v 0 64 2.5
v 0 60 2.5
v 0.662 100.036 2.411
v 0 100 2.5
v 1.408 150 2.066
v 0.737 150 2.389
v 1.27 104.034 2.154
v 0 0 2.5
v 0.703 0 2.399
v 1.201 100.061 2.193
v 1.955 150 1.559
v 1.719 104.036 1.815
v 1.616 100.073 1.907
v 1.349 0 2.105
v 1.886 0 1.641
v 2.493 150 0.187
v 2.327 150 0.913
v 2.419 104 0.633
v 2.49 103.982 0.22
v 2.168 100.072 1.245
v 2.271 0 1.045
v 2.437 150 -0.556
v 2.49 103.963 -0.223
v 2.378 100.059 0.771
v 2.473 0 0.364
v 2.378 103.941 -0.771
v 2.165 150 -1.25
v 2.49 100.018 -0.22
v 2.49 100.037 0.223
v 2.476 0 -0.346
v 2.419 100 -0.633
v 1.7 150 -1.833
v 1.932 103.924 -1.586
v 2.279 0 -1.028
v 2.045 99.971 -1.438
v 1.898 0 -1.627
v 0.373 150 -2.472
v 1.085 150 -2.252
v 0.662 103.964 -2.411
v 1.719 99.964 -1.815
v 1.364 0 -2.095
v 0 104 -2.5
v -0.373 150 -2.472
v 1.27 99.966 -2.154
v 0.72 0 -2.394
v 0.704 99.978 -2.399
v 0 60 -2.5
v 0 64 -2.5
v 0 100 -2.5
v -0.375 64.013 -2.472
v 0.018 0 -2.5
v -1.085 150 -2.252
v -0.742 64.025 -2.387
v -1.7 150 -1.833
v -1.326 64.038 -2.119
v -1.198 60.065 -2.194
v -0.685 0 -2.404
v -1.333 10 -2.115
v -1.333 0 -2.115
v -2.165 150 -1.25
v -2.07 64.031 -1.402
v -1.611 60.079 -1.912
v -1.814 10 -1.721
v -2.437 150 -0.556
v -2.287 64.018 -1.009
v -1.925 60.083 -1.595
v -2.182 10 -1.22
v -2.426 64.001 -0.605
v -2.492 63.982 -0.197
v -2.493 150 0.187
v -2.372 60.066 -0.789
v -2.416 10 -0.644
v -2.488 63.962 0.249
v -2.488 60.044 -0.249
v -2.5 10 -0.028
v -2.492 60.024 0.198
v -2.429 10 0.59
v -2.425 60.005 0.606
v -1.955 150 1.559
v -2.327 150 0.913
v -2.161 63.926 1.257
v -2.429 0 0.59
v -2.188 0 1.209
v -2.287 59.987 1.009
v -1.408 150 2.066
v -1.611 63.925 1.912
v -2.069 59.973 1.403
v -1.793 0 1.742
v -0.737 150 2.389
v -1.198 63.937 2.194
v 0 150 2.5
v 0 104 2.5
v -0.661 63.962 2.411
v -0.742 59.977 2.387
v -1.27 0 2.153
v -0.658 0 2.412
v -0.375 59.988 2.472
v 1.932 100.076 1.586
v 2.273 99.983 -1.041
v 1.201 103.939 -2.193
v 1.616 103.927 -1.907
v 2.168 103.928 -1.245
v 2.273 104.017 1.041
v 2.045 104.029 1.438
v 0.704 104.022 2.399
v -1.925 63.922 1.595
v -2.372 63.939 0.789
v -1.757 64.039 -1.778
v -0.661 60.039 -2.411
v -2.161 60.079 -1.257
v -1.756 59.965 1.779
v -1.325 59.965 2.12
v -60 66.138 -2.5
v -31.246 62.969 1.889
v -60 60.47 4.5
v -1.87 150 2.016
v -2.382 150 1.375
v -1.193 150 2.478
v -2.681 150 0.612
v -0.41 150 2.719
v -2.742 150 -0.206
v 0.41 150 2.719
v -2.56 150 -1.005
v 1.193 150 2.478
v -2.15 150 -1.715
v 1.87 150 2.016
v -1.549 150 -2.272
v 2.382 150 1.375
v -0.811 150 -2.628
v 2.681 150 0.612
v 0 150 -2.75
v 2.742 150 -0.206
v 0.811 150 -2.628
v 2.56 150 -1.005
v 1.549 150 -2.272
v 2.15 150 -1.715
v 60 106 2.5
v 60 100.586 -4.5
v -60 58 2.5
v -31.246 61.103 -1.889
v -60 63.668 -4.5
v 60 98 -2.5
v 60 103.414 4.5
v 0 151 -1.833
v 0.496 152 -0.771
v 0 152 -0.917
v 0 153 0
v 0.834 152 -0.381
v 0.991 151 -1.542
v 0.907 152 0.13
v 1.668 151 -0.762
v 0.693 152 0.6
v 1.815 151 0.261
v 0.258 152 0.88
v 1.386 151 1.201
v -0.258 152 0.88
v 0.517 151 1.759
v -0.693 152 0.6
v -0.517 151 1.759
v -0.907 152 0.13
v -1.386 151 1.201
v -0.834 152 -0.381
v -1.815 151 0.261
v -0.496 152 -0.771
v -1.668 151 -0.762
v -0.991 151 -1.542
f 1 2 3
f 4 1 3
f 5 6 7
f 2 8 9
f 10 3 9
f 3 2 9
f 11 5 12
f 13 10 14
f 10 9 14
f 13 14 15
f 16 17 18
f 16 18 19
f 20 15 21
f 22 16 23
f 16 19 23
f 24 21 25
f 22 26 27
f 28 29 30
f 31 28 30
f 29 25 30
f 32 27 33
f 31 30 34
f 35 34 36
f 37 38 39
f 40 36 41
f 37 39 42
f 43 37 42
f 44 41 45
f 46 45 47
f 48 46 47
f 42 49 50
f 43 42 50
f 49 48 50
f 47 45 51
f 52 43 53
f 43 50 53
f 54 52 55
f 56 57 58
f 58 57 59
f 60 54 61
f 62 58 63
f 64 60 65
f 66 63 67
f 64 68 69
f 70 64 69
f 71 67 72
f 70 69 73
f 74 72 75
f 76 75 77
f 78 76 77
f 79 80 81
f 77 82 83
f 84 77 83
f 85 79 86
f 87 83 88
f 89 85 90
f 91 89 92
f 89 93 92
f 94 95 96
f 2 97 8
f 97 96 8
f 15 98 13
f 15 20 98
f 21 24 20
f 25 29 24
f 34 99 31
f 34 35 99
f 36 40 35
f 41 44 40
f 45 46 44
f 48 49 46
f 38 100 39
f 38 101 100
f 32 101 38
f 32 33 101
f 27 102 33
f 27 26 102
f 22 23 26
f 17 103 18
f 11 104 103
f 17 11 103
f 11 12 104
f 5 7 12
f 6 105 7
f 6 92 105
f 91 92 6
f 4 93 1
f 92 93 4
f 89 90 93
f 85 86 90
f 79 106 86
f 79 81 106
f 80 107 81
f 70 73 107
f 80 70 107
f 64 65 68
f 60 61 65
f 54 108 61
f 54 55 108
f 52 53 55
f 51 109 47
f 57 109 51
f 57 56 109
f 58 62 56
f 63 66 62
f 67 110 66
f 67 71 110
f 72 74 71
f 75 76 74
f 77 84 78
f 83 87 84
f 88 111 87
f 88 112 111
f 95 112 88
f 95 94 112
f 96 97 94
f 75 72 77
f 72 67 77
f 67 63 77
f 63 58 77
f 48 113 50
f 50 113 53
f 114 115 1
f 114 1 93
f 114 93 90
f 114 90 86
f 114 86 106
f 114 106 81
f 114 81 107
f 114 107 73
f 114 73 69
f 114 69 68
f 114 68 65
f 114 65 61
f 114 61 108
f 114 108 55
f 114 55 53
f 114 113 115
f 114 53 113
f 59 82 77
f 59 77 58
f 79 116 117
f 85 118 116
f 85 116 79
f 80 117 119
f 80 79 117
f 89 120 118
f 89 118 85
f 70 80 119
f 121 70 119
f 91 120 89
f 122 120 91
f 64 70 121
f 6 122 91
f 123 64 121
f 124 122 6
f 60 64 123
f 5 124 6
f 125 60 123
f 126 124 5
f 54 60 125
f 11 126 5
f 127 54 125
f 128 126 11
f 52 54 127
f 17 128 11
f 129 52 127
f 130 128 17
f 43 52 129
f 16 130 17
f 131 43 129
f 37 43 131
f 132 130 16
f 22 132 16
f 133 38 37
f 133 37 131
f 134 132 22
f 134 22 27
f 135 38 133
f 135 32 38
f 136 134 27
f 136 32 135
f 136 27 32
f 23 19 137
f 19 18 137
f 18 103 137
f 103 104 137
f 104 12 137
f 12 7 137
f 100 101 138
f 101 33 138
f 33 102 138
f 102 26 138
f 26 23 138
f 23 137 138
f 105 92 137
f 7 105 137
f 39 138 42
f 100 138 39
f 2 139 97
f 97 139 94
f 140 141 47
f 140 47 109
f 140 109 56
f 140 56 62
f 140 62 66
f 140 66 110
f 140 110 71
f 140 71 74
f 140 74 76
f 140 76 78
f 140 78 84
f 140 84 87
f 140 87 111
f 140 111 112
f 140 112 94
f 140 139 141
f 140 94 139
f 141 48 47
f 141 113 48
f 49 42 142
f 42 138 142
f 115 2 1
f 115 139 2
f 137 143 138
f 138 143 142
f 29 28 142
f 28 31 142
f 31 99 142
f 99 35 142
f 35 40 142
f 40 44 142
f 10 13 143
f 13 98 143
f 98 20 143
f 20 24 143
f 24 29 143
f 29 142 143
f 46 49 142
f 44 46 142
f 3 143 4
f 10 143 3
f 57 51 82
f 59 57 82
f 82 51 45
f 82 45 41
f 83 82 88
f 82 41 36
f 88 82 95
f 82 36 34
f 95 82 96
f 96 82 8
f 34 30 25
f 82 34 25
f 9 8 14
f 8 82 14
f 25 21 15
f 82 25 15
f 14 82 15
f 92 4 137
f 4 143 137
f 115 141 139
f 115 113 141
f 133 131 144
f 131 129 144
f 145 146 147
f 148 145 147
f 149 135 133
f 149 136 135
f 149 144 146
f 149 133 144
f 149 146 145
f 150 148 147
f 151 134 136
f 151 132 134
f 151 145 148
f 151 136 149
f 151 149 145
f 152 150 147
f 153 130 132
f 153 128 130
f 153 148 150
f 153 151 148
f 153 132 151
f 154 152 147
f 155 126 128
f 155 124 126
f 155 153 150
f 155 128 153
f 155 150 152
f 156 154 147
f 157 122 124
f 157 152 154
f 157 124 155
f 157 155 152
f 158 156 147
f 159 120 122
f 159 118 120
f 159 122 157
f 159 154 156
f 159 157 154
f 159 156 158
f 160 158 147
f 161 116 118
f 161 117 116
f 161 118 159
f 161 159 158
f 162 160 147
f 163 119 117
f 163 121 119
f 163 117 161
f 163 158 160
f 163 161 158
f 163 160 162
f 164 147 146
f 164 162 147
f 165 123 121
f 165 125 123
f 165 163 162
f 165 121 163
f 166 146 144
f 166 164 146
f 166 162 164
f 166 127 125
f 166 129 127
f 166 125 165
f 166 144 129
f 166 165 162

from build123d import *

# Parameters (mm, degrees)
SKETCH1_R           = 2.5
BOSS_EXTRUDE1_DEPTH = 150
CUT_EXTRUDE1_DEPTH  = 10


with BuildPart() as part:
    # Sketch1 → Boss-Extrude1 (new body)
    with BuildSketch(Plane(origin=(0, 0, 0), x_dir=(1, 0, 0), z_dir=(0, 1, 0))):
        with Locations(Location((0, 0, 0), (0, 0, 270))):
            Circle(SKETCH1_R)
    extrude(amount=BOSS_EXTRUDE1_DEPTH)

    # Sketch5 → Revolve9 (revolve)
    with BuildSketch(Plane(origin=(0, 0, 0), x_dir=(0, 0, -1), z_dir=(1, 0, 0)), mode=Mode.PRIVATE) as revolve9_sk:
        Polygon((-2.75, 150), (0, 150), (0, 153), align=None)
    revolve(revolve9_sk.sketch.rotate(Axis((0, 150, 0), (0, -1, 0)), 180), axis=Axis((0, 150, 0), (0, -1, 0)))

    # Sketch17 → Cut-Extrude1 (cut)
    with BuildSketch(Plane.XZ):
        with BuildLine():
            Line((-2.43587323, 0.605492864), (-1.326757825, -2.130683851))
            ThreePointArc((-1.326757825, -2.130683851), (-2.326158608, -0.94291364), (-2.43587323, 0.605492864))
        make_face()
    extrude(amount=-CUT_EXTRUDE1_DEPTH, mode=Mode.SUBTRACT)

    # Sketch18 → Loft1 section 0
    with BuildSketch(Plane(origin=(0, 0, 0), x_dir=(0, 0, -1), z_dir=(1, 0, 0))):
        with BuildLine():
            Line((2.5, 60), (-2.5, 60))
            Line((-2.5, 60), (-2.5, 64))
            Line((-2.5, 64), (2.5, 64))
            Line((2.5, 64), (2.5, 60))
        make_face()
    # Sketch19 → Loft1 section 1
    with BuildSketch(Plane(origin=(-60, 0, 0), x_dir=(0, 0, -1), z_dir=(1, 0, 0))):
        with BuildLine():
            Line((4.5, 63.668014387), (-2.5, 58))
            Line((-2.5, 58), (-4.5, 60.470000787))
            Line((-4.5, 60.470000787), (2.5, 66.138015175))
            Line((2.5, 66.138015175), (4.5, 63.668014387))
        make_face()
    loft()

    # Sketch20 → Loft2 section 0
    with BuildSketch(Plane(origin=(0, 0, 0), x_dir=(0, 0, -1), z_dir=(1, 0, 0))):
        with BuildLine():
            Line((2.5, 100), (-2.5, 100))
            Line((-2.5, 100), (-2.5, 104))
            Line((-2.5, 104), (2.5, 104))
            Line((2.5, 104), (2.5, 100))
        make_face()
    # Sketch21 → Loft2 section 1
    with BuildSketch(Plane(origin=(60, 0, 0), x_dir=(0, 0, -1), z_dir=(1, 0, 0))):
        with BuildLine():
            Line((-2.5, 106), (-4.5, 103.414213562))
            Line((-4.5, 103.414213562), (2.5, 98))
            Line((2.5, 98), (4.5, 100.585786438))
            Line((4.5, 100.585786438), (-2.5, 106))
        make_face()
    loft()


solid = part.part
